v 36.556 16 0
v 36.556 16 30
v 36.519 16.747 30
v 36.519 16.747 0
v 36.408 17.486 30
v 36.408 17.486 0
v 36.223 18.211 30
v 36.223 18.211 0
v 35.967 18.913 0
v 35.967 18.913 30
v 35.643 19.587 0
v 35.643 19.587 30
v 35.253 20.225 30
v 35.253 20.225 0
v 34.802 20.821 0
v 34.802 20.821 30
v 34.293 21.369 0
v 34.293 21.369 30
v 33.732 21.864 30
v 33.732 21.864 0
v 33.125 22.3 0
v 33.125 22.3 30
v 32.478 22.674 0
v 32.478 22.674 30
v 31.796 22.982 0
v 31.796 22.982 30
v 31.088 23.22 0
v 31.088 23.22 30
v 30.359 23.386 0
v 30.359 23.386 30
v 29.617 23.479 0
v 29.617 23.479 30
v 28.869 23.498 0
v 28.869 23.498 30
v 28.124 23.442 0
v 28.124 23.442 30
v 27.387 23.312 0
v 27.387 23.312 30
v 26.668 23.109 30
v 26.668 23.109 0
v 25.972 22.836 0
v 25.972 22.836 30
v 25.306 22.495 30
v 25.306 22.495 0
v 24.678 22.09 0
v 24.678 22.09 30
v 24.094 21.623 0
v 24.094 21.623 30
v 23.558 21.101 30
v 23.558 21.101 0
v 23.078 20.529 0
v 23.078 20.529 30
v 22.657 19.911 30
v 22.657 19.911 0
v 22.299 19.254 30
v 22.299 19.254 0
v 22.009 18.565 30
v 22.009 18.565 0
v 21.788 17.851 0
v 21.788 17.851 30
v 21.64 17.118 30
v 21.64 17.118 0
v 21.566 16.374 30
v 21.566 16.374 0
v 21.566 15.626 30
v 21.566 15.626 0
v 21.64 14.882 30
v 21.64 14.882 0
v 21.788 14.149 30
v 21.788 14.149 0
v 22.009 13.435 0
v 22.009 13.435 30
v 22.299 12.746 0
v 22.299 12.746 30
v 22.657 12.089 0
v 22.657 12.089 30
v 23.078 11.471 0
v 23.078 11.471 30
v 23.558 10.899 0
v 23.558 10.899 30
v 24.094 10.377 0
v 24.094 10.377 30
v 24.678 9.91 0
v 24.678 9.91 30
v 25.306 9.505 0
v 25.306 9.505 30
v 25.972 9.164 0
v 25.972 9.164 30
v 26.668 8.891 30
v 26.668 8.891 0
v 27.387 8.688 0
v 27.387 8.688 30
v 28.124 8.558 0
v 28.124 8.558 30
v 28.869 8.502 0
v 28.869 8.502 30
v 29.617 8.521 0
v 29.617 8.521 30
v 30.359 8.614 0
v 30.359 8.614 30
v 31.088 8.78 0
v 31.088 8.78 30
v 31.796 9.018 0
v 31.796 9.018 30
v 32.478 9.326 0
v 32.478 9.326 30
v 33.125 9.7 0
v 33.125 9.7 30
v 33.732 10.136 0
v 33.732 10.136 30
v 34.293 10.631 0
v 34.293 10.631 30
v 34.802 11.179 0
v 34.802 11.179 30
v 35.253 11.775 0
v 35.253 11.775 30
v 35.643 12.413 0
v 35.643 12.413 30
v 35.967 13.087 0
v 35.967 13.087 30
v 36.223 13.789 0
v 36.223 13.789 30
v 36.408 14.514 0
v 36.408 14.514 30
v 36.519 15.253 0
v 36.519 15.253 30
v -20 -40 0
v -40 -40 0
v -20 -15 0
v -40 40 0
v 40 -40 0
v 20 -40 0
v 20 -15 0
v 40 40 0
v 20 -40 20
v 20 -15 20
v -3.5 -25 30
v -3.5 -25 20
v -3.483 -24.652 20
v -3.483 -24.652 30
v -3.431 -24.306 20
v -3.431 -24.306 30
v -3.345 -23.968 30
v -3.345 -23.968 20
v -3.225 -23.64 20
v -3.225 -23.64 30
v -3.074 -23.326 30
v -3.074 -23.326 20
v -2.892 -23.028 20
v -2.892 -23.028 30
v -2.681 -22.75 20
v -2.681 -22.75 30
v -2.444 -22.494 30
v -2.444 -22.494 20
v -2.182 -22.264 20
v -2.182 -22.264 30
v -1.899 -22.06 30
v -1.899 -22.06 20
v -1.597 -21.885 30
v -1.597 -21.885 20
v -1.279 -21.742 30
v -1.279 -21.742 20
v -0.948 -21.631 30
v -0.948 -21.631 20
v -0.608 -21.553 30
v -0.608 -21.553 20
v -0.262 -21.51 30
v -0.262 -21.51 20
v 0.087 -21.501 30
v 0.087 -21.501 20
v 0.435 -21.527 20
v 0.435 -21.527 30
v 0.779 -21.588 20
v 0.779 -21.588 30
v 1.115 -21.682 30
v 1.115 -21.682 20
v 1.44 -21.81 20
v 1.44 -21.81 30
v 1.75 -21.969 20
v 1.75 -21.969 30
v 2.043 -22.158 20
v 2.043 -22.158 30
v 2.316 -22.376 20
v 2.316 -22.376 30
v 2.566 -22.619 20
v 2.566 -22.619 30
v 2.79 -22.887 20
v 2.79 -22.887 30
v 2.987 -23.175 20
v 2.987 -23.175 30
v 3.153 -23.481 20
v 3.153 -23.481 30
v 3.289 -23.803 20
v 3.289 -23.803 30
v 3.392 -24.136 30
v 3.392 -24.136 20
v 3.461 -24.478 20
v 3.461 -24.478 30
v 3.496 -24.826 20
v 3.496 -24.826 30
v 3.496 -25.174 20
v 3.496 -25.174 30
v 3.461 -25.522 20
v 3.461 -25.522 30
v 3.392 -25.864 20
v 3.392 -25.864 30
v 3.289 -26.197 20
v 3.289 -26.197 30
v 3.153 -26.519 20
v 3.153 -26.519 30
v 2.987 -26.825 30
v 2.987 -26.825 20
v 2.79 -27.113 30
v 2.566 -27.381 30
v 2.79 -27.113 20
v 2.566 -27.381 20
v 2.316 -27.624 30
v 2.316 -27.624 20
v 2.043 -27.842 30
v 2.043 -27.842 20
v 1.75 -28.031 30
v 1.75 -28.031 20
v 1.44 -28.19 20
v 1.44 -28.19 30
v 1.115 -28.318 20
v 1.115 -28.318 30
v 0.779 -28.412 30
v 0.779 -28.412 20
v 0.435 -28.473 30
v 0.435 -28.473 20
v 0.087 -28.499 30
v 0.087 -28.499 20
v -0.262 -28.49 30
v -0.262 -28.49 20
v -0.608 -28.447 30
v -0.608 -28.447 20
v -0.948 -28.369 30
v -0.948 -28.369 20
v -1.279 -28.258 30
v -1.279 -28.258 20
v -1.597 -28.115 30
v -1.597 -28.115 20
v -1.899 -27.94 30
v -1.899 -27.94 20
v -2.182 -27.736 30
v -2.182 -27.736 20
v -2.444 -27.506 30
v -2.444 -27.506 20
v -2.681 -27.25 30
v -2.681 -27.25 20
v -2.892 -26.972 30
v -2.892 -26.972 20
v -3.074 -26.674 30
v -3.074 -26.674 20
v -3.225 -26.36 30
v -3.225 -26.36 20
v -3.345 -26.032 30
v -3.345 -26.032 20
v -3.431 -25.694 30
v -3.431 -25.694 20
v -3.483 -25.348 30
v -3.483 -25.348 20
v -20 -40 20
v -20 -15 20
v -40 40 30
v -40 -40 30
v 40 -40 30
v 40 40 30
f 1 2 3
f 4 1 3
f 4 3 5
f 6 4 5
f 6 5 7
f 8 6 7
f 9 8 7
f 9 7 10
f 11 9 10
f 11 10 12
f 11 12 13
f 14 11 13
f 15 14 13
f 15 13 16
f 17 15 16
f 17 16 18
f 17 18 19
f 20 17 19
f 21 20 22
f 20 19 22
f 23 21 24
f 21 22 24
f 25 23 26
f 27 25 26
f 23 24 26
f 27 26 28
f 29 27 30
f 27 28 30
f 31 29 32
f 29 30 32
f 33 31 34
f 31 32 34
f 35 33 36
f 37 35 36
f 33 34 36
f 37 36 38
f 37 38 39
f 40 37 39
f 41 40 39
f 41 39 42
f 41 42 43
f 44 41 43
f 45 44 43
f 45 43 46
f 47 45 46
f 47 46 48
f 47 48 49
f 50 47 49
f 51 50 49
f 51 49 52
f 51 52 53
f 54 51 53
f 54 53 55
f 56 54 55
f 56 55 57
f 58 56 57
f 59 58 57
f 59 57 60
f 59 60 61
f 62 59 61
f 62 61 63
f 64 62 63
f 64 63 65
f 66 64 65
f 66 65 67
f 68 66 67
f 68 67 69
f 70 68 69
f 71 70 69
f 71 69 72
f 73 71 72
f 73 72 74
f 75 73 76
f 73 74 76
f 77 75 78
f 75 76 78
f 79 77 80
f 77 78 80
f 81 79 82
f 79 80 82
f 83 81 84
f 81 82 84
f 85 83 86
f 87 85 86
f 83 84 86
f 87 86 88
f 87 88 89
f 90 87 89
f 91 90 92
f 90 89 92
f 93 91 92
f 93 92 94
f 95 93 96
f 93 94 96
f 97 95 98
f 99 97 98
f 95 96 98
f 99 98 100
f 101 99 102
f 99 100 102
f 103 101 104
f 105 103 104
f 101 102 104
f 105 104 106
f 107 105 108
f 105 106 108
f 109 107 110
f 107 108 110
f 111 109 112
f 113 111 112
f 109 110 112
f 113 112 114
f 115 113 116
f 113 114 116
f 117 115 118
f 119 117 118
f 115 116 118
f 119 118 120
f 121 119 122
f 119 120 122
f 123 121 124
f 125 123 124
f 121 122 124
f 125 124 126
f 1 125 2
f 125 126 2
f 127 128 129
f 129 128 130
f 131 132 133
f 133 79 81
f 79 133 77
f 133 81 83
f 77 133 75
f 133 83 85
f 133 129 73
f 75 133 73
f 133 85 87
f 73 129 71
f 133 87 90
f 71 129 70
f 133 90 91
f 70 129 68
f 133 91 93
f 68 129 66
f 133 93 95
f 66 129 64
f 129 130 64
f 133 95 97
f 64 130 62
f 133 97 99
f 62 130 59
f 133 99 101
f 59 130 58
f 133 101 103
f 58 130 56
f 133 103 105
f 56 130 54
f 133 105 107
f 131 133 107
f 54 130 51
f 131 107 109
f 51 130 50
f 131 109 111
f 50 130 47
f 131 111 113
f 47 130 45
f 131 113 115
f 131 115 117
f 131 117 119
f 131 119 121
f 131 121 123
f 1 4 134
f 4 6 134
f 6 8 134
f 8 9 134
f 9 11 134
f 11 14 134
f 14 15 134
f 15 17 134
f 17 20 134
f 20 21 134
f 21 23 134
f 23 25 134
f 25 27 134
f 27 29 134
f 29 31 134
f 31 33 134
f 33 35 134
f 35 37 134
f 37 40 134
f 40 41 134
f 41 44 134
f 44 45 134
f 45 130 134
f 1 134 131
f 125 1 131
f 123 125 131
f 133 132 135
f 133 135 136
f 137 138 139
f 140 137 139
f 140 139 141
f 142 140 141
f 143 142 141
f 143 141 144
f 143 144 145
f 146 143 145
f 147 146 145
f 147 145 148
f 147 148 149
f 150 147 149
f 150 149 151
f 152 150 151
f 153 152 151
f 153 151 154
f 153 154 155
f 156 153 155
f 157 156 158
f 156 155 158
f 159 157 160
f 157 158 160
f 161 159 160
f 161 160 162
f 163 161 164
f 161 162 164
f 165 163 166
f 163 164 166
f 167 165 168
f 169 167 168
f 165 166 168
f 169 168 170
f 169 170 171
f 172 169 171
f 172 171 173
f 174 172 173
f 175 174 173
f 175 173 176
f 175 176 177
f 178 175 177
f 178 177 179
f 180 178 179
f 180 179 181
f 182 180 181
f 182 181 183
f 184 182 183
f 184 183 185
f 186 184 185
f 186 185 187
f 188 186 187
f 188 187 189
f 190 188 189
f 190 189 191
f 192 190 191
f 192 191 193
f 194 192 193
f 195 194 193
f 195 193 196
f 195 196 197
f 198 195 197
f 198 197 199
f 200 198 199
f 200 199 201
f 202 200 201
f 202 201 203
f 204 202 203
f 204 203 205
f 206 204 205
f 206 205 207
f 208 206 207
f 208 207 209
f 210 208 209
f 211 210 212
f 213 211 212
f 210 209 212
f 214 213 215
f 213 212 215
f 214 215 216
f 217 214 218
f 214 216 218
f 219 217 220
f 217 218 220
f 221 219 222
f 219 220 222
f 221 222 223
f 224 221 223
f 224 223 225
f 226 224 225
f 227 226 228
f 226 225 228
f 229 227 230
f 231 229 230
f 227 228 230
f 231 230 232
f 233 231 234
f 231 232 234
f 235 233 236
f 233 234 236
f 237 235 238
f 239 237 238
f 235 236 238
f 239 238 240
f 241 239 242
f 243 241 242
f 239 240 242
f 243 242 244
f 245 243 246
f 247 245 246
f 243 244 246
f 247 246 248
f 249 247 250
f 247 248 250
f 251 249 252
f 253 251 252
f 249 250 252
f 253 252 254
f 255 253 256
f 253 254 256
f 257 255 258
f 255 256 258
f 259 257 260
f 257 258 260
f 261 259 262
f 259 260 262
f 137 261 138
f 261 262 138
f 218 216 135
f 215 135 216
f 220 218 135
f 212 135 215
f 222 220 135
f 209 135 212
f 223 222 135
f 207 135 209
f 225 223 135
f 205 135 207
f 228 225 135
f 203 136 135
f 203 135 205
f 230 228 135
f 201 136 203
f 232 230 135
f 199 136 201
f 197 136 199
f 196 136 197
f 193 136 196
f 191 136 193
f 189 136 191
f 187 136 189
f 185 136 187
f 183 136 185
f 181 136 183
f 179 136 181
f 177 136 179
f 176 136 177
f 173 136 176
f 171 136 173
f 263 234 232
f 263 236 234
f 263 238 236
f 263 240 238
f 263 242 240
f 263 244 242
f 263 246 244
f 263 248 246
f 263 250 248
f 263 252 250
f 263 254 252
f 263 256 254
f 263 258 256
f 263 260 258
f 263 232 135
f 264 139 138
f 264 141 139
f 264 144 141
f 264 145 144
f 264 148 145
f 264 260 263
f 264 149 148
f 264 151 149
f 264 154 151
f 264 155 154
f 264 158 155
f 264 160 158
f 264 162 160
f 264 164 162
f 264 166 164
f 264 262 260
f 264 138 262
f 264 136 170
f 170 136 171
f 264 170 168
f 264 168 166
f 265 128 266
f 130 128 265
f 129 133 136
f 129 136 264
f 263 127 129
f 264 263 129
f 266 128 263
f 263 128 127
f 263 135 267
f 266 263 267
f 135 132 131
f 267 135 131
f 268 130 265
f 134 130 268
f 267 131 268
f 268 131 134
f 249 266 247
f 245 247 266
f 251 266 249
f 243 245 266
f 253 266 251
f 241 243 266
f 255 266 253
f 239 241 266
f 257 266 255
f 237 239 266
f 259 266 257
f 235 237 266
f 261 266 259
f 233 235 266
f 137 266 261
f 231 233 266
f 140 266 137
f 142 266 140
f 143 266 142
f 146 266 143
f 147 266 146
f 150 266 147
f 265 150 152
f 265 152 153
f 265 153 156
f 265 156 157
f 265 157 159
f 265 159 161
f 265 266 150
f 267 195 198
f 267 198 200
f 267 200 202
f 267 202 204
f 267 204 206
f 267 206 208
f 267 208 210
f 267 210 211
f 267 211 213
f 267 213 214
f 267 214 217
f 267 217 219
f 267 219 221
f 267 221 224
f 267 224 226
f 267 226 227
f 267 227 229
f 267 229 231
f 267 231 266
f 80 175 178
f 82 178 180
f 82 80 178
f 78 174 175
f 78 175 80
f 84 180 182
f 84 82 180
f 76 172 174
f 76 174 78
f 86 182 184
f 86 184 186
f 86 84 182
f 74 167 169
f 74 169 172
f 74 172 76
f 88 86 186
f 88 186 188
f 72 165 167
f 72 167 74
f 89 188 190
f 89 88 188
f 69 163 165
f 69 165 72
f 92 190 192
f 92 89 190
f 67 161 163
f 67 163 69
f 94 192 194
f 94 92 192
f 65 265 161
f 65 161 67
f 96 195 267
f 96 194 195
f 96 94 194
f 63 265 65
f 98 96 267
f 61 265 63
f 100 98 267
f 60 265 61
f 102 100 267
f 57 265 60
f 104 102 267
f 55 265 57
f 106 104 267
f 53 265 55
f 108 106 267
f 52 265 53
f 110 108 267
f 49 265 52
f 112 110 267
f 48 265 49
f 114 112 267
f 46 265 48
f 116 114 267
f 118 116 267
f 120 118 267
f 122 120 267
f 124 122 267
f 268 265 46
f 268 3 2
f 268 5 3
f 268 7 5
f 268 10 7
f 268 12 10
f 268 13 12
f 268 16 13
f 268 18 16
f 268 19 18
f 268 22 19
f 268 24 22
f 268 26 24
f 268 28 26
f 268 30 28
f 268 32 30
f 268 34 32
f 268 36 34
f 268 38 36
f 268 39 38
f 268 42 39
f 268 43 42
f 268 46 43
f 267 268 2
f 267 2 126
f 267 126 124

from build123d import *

# Parameters (mm, degrees)
SKETCH1_W           = 80
SKETCH1_H           = 80
BOSS_EXTRUDE1_DEPTH = 30
SKETCH3_W           = 40
SKETCH3_H           = 25
CUT_EXTRUDE2_DEPTH  = 20
SKETCH4_R           = 3.5
CUT_EXTRUDE3_DEPTH  = 61
SKETCH6_R           = 7.5
CUT_EXTRUDE5_DEPTH  = 65.031242374


with BuildPart() as part:
    # Sketch1 → Boss-Extrude1 (new body)
    with BuildSketch(Plane.XY):
        Rectangle(SKETCH1_W, SKETCH1_H)
    extrude(amount=BOSS_EXTRUDE1_DEPTH)

    # Sketch3 → Cut-Extrude2 (cut)
    with BuildSketch(Plane(origin=(0, 0, 0), x_dir=(-1, 0, 0), z_dir=(0, 0, -1))):
        with Locations((0, -27.5)):
            Rectangle(SKETCH3_W, SKETCH3_H)
    extrude(amount=-CUT_EXTRUDE2_DEPTH, mode=Mode.SUBTRACT)

    # Sketch4 → Cut-Extrude3 (cut, through all)
    with BuildSketch(Plane(origin=(0, 0, 20), x_dir=(-1, 0, 0), z_dir=(0, 0, -1))):
        with Locations((0, -25)):
            Circle(SKETCH4_R)
    extrude(amount=-CUT_EXTRUDE3_DEPTH, mode=Mode.SUBTRACT)

    # Sketch6 → Cut-Extrude5 (cut, through all)
    with BuildSketch(Plane.XY.offset(30)):
        with Locations((29.056312598, 16)):
            Circle(SKETCH6_R)
    extrude(amount=-CUT_EXTRUDE5_DEPTH, mode=Mode.SUBTRACT)


solid = part.part
